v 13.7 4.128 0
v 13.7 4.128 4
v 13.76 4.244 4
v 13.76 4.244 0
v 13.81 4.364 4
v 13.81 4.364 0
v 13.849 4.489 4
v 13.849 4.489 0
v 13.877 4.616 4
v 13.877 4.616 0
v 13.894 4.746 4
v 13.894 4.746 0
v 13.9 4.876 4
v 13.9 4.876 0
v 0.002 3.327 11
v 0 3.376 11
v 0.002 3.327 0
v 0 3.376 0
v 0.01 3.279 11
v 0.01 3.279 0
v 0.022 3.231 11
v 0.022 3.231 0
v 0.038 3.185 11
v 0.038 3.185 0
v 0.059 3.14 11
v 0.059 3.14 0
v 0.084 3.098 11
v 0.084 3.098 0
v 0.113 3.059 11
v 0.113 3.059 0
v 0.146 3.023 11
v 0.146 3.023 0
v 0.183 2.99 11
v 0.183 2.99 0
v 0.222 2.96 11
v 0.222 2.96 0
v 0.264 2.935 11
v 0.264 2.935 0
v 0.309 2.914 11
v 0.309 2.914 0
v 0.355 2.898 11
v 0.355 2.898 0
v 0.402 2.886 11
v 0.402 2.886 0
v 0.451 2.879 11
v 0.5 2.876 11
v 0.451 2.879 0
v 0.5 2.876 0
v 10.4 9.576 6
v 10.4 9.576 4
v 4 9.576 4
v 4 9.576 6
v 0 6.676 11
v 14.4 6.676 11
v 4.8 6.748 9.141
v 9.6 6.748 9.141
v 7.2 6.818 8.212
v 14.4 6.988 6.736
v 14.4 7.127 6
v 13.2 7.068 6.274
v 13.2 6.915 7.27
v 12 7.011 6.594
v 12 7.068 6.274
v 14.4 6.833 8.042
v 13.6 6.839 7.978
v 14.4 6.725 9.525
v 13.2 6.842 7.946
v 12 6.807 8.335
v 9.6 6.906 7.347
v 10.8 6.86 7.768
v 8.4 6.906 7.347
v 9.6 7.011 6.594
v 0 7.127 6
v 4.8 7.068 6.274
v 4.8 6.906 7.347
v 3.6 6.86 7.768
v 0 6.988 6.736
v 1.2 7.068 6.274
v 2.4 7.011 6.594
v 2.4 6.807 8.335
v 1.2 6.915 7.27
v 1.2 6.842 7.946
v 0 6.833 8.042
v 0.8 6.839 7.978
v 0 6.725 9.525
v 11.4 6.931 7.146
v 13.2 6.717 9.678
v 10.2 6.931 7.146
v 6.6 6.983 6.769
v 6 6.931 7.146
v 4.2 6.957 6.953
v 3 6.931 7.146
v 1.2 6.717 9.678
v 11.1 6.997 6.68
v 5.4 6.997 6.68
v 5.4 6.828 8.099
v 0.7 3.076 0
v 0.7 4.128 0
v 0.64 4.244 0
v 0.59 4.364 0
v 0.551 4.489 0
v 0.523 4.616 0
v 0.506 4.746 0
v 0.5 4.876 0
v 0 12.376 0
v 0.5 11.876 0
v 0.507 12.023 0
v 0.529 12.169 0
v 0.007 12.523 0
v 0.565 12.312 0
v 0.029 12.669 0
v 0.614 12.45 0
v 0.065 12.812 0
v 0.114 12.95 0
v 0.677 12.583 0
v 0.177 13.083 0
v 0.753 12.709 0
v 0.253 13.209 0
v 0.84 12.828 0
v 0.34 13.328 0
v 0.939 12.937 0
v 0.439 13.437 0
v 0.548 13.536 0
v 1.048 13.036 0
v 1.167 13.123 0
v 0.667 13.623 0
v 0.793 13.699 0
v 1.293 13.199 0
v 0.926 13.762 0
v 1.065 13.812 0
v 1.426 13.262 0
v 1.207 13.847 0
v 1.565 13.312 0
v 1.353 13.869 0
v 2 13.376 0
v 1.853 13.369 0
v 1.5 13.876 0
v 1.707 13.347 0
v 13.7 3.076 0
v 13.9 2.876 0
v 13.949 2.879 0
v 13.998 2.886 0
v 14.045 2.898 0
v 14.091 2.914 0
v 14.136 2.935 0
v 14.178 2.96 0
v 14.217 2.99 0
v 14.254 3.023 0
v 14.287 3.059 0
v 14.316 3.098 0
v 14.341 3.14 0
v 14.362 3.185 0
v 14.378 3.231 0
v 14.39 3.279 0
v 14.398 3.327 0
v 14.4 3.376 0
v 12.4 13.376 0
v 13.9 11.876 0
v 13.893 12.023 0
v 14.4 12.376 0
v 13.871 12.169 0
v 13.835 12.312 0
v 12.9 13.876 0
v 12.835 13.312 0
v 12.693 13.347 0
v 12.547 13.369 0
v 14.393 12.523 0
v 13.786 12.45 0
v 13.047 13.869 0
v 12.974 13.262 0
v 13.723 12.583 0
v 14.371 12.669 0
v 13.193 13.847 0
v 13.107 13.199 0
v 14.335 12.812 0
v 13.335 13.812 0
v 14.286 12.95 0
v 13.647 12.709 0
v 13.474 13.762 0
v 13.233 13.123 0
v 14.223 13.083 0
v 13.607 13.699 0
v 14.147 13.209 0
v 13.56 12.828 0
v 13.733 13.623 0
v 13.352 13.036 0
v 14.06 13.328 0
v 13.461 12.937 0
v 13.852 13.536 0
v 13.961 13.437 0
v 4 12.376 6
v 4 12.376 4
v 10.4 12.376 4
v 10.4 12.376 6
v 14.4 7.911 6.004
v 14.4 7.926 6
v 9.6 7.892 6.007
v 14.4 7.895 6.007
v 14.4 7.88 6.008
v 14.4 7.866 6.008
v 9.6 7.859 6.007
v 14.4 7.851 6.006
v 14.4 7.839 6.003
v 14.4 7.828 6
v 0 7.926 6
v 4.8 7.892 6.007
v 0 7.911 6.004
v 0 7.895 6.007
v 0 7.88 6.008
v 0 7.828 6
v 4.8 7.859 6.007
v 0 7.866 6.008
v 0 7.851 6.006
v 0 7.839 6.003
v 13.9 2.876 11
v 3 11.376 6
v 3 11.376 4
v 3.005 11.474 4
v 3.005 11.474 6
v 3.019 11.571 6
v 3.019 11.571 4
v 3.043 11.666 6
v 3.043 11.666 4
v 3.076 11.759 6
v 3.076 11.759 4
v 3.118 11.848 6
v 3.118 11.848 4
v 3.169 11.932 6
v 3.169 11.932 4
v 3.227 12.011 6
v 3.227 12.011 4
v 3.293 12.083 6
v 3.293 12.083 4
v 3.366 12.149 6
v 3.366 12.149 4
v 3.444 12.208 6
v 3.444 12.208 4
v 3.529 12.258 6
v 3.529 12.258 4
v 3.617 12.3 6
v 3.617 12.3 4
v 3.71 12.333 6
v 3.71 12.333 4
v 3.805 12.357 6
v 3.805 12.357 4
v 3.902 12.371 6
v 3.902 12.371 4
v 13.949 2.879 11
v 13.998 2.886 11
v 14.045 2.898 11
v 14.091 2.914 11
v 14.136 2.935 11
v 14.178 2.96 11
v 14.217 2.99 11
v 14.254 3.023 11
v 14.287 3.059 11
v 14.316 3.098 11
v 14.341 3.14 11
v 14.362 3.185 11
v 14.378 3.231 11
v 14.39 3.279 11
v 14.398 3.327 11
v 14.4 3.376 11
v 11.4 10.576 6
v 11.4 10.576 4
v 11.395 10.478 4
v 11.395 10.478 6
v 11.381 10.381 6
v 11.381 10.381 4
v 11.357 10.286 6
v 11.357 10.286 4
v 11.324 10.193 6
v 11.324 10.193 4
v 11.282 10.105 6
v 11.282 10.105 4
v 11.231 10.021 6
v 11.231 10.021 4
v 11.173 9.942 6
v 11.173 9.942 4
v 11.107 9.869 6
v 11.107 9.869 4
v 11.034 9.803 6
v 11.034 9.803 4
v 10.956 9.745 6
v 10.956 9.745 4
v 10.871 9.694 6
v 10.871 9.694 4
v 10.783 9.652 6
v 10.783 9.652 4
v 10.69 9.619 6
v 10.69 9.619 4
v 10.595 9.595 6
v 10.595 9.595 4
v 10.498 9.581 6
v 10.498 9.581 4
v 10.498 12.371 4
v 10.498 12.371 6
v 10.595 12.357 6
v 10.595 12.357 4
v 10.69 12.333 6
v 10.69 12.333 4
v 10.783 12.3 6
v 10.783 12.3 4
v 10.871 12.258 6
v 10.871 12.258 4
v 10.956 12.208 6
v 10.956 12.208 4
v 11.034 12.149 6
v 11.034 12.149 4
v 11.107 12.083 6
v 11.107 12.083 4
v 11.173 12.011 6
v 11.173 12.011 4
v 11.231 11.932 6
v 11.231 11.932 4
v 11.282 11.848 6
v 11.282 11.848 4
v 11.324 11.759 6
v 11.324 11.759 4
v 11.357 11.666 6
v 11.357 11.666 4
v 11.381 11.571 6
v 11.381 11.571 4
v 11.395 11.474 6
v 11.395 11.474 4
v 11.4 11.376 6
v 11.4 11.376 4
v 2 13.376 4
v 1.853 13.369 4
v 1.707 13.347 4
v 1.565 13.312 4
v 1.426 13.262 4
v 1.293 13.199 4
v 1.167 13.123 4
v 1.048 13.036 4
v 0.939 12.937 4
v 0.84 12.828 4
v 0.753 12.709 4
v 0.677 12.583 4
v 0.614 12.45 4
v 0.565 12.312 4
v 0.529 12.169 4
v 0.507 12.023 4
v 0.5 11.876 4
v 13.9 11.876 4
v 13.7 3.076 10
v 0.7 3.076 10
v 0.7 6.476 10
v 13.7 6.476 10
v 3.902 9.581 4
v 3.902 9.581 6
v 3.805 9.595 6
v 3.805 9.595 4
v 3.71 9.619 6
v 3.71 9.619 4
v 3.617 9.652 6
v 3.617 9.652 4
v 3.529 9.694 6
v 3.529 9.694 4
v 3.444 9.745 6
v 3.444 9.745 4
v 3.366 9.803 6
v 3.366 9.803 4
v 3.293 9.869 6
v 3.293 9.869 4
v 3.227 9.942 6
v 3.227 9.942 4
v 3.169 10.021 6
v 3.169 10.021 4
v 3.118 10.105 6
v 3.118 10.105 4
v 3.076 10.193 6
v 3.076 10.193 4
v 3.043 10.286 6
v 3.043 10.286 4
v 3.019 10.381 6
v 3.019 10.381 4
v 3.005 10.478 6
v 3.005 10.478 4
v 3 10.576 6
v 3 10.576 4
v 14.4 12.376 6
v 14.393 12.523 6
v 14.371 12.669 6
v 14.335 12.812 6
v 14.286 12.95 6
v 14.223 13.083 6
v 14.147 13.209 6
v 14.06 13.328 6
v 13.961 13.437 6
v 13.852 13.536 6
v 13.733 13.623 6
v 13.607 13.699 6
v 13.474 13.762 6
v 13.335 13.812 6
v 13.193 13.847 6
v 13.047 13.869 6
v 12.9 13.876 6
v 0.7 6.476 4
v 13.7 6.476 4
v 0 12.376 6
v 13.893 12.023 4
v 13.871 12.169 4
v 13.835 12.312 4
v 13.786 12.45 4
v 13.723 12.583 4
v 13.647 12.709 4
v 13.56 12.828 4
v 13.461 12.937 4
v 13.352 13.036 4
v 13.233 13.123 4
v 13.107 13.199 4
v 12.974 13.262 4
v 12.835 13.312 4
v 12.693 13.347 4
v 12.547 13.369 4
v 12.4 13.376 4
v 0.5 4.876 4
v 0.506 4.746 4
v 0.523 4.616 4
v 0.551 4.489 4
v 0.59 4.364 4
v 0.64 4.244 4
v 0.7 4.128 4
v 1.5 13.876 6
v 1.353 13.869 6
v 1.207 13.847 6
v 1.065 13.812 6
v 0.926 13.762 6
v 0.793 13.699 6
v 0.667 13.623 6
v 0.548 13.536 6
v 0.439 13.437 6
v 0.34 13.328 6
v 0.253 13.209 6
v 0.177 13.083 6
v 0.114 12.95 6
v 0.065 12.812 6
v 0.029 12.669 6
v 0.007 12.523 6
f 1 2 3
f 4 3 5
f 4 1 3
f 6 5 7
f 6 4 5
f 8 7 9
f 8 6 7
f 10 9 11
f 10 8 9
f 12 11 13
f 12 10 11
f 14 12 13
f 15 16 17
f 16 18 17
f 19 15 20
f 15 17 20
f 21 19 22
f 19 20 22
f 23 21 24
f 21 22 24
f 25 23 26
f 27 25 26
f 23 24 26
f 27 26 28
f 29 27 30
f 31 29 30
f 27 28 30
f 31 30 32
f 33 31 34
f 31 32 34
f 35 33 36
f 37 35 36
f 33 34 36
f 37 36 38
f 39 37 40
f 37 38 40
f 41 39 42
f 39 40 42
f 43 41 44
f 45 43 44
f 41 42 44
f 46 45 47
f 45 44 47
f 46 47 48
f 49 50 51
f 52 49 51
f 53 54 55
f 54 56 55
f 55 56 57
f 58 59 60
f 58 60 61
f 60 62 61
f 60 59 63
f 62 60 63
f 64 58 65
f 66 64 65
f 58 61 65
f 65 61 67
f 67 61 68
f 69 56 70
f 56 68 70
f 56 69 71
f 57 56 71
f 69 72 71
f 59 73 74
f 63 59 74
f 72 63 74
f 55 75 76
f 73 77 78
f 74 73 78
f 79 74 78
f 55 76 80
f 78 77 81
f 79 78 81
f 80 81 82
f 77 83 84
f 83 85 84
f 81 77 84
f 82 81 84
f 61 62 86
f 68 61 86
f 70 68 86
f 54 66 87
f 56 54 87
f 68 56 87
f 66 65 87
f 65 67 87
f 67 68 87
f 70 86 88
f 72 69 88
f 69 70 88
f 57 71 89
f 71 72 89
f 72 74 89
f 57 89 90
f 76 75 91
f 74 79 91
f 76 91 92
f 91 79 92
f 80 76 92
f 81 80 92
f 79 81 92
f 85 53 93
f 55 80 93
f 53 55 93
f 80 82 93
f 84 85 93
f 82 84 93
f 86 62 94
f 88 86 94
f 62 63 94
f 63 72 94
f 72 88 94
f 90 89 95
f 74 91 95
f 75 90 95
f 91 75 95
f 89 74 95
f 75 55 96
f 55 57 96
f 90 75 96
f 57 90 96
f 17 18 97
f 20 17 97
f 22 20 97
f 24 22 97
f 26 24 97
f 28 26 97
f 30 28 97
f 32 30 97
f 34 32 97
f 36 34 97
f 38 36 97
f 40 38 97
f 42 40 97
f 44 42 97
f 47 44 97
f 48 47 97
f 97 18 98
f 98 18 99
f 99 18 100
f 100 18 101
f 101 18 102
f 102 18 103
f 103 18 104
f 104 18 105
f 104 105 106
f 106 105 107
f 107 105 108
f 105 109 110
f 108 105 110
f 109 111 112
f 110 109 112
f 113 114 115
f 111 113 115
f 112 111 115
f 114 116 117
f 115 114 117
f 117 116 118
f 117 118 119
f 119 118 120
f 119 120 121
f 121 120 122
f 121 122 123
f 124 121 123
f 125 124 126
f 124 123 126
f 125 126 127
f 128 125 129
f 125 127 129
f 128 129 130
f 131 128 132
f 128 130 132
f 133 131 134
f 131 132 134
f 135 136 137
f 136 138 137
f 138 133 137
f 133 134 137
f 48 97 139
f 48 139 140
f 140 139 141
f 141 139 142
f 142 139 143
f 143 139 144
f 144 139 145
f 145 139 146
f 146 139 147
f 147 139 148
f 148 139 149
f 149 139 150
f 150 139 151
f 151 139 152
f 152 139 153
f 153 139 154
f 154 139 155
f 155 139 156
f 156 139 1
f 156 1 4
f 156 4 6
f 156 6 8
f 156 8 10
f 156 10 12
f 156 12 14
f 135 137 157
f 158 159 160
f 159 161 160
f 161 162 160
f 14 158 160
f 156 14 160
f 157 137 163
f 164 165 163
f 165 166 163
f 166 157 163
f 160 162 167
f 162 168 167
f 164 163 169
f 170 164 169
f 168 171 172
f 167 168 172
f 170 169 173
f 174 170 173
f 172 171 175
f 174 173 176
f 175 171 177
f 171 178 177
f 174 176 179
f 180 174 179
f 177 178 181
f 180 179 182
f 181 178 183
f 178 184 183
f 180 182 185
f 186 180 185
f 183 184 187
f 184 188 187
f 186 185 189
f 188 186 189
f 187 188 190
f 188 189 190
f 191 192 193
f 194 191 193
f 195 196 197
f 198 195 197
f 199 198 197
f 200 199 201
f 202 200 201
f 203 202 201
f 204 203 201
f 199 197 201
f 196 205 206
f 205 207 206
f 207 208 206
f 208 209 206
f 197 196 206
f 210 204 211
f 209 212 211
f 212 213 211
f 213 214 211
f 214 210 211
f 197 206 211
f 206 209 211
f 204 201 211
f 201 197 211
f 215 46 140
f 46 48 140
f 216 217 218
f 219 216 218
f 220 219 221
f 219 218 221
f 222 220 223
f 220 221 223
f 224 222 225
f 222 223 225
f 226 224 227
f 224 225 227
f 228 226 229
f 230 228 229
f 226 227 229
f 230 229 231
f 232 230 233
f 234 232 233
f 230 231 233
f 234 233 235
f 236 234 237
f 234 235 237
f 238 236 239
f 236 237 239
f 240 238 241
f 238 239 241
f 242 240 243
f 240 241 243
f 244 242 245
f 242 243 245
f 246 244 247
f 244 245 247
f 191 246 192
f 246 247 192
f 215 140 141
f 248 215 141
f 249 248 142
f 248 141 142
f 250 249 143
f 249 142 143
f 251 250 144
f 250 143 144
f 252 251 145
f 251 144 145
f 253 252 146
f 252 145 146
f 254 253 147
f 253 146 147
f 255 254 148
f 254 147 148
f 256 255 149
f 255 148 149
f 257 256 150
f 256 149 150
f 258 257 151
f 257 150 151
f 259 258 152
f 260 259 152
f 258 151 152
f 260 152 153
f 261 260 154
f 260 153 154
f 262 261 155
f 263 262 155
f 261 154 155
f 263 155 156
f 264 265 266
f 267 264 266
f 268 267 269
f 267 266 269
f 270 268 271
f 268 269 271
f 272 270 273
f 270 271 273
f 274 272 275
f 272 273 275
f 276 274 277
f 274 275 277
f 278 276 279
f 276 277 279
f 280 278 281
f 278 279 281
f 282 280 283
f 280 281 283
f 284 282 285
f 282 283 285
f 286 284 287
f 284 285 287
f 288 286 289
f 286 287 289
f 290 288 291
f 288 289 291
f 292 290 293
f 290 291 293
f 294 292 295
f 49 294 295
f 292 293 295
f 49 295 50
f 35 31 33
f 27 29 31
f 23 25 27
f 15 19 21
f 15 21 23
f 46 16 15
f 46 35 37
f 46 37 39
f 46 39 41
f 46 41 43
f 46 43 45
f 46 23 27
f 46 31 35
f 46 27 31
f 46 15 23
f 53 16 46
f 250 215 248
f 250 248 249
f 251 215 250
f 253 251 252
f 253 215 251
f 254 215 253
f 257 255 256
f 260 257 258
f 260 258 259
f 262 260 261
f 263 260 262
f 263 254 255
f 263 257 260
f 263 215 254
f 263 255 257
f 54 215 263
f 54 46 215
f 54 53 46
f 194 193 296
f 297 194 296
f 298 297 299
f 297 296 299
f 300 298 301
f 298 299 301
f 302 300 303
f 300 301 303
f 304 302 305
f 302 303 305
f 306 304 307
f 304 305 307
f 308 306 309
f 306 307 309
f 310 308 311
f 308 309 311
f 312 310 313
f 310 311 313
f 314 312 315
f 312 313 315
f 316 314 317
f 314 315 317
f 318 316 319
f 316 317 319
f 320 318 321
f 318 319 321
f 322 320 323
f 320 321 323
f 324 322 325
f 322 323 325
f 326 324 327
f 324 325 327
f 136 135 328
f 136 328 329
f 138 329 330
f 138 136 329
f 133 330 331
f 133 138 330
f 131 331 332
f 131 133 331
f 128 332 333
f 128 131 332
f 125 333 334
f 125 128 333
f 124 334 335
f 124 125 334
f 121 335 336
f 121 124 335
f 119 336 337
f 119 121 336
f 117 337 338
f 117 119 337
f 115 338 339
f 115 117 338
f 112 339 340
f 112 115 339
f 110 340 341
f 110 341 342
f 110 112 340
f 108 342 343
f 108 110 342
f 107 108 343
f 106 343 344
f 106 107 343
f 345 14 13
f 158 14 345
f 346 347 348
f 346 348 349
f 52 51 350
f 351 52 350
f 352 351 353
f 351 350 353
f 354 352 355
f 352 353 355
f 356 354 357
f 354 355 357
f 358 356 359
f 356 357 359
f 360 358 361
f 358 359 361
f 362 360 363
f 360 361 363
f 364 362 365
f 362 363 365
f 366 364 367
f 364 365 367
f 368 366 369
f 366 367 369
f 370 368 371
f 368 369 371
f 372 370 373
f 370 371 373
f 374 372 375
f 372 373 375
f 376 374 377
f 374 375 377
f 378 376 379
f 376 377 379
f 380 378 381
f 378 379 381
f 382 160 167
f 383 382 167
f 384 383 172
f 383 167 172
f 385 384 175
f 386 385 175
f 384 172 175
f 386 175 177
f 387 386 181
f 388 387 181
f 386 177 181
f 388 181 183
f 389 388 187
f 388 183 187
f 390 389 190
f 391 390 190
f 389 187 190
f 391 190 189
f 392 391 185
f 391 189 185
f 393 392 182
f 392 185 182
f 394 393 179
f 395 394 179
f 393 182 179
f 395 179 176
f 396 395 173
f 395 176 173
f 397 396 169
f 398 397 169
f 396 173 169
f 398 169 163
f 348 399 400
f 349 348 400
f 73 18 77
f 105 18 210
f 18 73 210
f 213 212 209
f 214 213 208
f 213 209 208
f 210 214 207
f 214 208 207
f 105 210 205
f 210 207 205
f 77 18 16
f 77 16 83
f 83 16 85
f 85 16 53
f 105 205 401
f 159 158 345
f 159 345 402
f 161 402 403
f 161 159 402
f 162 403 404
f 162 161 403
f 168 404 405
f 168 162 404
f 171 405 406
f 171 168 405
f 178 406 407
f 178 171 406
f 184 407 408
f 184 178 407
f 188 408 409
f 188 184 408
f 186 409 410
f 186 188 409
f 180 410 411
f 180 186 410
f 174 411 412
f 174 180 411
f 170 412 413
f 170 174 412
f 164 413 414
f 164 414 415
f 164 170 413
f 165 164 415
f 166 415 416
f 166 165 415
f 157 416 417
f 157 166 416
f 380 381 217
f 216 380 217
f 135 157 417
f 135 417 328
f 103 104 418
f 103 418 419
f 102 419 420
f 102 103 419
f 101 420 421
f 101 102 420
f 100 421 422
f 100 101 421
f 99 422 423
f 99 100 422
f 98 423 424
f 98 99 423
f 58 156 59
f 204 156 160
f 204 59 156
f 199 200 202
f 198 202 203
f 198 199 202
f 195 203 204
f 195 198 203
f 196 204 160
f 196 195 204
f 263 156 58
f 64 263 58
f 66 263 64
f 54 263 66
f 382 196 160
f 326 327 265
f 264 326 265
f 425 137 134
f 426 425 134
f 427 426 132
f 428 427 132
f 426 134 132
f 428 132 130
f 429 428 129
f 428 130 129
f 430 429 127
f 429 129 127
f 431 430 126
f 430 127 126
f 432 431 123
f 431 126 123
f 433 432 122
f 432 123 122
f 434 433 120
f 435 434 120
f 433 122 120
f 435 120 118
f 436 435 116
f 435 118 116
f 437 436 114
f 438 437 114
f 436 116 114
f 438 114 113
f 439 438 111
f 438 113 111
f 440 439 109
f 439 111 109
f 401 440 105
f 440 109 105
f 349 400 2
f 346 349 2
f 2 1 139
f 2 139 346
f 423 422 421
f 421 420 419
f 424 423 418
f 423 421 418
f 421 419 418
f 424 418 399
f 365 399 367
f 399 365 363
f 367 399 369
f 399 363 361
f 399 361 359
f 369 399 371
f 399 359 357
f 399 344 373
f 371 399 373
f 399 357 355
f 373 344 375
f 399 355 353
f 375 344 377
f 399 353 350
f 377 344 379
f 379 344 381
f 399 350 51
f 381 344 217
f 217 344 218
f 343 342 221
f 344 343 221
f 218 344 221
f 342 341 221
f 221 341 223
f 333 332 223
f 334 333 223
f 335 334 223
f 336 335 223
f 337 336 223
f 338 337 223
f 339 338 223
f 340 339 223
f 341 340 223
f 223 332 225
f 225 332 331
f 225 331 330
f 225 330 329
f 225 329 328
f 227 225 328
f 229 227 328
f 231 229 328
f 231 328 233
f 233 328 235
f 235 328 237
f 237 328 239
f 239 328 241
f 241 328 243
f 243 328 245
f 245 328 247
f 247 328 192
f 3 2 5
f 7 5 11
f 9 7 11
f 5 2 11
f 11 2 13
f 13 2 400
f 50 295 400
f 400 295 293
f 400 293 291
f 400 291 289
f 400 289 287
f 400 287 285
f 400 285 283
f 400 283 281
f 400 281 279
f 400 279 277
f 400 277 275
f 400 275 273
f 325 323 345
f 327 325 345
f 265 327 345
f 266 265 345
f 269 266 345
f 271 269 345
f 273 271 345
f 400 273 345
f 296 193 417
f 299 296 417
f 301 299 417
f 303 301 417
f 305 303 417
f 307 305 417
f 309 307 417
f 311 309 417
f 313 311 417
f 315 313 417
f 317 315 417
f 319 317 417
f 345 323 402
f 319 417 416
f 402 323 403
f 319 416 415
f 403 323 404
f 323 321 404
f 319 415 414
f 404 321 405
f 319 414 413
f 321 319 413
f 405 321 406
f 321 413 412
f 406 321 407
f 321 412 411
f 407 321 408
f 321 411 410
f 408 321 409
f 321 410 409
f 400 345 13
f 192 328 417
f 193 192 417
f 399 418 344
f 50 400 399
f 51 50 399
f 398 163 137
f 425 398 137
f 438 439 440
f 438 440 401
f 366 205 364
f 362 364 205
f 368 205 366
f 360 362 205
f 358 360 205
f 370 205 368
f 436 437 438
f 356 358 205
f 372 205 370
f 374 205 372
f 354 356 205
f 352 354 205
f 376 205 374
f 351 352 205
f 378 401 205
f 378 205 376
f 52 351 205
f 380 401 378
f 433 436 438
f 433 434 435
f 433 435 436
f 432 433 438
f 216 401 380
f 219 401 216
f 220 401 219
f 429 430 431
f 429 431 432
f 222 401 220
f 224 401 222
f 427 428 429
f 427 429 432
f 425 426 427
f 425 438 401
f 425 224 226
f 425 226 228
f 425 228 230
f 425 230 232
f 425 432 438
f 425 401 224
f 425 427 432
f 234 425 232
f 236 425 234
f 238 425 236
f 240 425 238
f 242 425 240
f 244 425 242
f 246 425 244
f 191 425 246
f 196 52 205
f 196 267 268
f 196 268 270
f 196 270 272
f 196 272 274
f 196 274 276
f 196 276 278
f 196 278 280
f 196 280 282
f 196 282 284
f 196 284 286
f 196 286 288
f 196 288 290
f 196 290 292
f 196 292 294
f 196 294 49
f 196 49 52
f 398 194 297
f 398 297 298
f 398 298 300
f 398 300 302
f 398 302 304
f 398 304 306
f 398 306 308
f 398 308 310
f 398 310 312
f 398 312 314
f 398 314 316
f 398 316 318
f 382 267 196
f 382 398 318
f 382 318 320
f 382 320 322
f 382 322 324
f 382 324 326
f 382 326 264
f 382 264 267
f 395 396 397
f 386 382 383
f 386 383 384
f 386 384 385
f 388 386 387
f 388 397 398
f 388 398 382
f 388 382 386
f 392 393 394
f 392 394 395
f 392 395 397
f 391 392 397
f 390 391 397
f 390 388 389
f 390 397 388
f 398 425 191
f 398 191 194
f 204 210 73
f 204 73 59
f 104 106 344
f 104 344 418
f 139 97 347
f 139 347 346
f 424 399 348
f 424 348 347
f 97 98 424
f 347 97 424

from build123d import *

# Parameters (mm, degrees)
F1_DEPTH = 6
F3_DEPTH = 4
F5_DEPTH = 5
F6_W     = 13
F6_H     = 3.4
F7_DEPTH = 10
F9_DEPTH = 14.4


# Not quite as in the source:
# - a feature names something its author has since deleted; it is built from what else it names


with BuildPart() as f1:
    # F0 (on Top) → F1 (new body)
    with BuildSketch(Plane.XY):
        with BuildLine():
            ThreePointArc((0, 3.3761399509), (0.1464466094, 3.0225865603), (0.5, 2.8761399509))
            Line((0.5, 2.8761399509), (13.9, 2.8761399509))
            ThreePointArc((13.9, 2.8761399509), (14.2535533906, 3.0225865603), (14.4, 3.3761399509))
            Line((14.4, 3.3761399509), (0, 3.3761399509))
        make_face()
        with BuildLine():
            Line((0, 12.3761399509), (0, 3.3761399509))
            Line((0, 3.3761399509), (14.4, 3.3761399509))
            Line((14.4, 3.3761399509), (14.4, 12.3761399509))
            ThreePointArc((14.4, 12.3761399509), (13.9606601718, 13.4368001227), (12.9, 13.8761399509))
            Line((12.9, 13.8761399509), (1.5, 13.8761399509))
            ThreePointArc((1.5, 13.8761399509), (0.4393398282, 13.4368001227), (0, 12.3761399509))
        make_face()
        with BuildLine():
            ThreePointArc((3, 11.3761399509), (3.2928932188, 12.0832467321), (4, 12.3761399509))
            Line((4, 12.3761399509), (10.4, 12.3761399509))
            ThreePointArc((10.4, 12.3761399509), (11.1071067812, 12.0832467321), (11.4, 11.3761399509))
            Line((11.4, 11.3761399509), (11.4, 10.5761399509))
            ThreePointArc((11.4, 10.5761399509), (11.1071067812, 9.8690331698), (10.4, 9.5761399509))
            Line((10.4, 9.5761399509), (4, 9.5761399509))
            ThreePointArc((4, 9.5761399509), (3.2928932188, 9.8690331698), (3, 10.5761399509))
            Line((3, 10.5761399509), (3, 11.3761399509))
        make_face(mode=Mode.SUBTRACT)
    extrude(amount=F1_DEPTH)

    # F2 (on Top) → F3 (cut)
    with BuildSketch(Plane.XY):
        with BuildLine():
            ThreePointArc((13.9, 11.8761399509), (13.4606601718, 12.9368001227), (12.4, 13.3761399509))
            Line((12.4, 13.3761399509), (2, 13.3761399509))
            ThreePointArc((2, 13.3761399509), (0.9393398282, 12.9368001227), (0.5, 11.8761399509))
            Line((0.5, 11.8761399509), (0.5, 4.8761399509))
            ThreePointArc((0.5, 4.8761399509), (0.9393398282, 3.8154797792), (2, 3.3761399509))
            Line((2, 3.3761399509), (12.4, 3.3761399509))
            ThreePointArc((12.4, 3.3761399509), (13.4606601718, 3.8154797792), (13.9, 4.8761399509))
            Line((13.9, 4.8761399509), (13.9, 11.8761399509))
        make_face()
    extrude(amount=F3_DEPTH, mode=Mode.SUBTRACT)

    # F4 (on face) → F5 (join)
    with BuildSketch(Plane.XY.offset(6)):
        with BuildLine():
            Line((14.4, 6.6761399509), (0, 6.6761399509))
            Line((0, 6.6761399509), (0, 3.3761399509))
            ThreePointArc((0, 3.3761399509), (0.1464466094, 3.0225865603), (0.5, 2.8761399509))
            Line((0.5, 2.8761399509), (13.9, 2.8761399509))
            ThreePointArc((13.9, 2.8761399509), (14.2535533906, 3.0225865603), (14.4, 3.3761399509))
            Line((14.4, 3.3761399509), (14.4, 6.6761399509))
        make_face()
    extrude(amount=F5_DEPTH)

    # F6 (on face) → F7 (cut)
    with BuildSketch(Plane(origin=(0, 0, 0), x_dir=(1, 0, 0), z_dir=(0, 0, -1))):
        with Locations((7.2, -4.7761399509)):
            Rectangle(F6_W, F6_H)
    extrude(amount=-F7_DEPTH, mode=Mode.SUBTRACT)

    # F8 (on Right) → F9 (join)
    with BuildSketch(Plane.YZ):
        with BuildLine():
            add(Edge.make_bspline(
                [(7.1272827151, 6), (6.8833303011, 6.9959140901), (6.6957208529, 9.2354907336), (6.6761399509, 11)],
                knots=[0.4613630388, 0.4613630388, 0.4613630388, 0.4613630388, 1, 1, 1, 1], degree=3))
            Line((6.6761399509, 11), (6.6761399509, 6))
            Line((6.6761399509, 6), (7.1272827151, 6))
        make_face()
        with BuildLine():
            add(Edge.make_bspline(
                [(7.9261399509, 6), (7.8912804031, 6.0110682928), (7.8586101723, 6.0100642713), (7.8278293535, 6)],
                knots=[0, 0, 0, 0, 0.0376755281, 0.0376755281, 0.0376755281, 0.0376755281], degree=3))
            Line((7.8278293535, 6), (7.9261399509, 6))
        make_face()
        with BuildLine():
            Line((7.8278293535, 6), (7.1272827151, 6))
            add(Edge.make_bspline(
                [(7.8278293535, 6), (7.6417958125, 5.9391734168), (7.4240615582, 5.2101966849), (7.2160450595, 5.6376356026), (7.1272827151, 6)],
                knots=[0.0376755281, 0.0376755281, 0.0376755281, 0.0376755281, 0.2653794095, 0.4613630388, 0.4613630388, 0.4613630388, 0.4613630388], degree=3))
        make_face()
    extrude(amount=F9_DEPTH)


solid = f1.part
